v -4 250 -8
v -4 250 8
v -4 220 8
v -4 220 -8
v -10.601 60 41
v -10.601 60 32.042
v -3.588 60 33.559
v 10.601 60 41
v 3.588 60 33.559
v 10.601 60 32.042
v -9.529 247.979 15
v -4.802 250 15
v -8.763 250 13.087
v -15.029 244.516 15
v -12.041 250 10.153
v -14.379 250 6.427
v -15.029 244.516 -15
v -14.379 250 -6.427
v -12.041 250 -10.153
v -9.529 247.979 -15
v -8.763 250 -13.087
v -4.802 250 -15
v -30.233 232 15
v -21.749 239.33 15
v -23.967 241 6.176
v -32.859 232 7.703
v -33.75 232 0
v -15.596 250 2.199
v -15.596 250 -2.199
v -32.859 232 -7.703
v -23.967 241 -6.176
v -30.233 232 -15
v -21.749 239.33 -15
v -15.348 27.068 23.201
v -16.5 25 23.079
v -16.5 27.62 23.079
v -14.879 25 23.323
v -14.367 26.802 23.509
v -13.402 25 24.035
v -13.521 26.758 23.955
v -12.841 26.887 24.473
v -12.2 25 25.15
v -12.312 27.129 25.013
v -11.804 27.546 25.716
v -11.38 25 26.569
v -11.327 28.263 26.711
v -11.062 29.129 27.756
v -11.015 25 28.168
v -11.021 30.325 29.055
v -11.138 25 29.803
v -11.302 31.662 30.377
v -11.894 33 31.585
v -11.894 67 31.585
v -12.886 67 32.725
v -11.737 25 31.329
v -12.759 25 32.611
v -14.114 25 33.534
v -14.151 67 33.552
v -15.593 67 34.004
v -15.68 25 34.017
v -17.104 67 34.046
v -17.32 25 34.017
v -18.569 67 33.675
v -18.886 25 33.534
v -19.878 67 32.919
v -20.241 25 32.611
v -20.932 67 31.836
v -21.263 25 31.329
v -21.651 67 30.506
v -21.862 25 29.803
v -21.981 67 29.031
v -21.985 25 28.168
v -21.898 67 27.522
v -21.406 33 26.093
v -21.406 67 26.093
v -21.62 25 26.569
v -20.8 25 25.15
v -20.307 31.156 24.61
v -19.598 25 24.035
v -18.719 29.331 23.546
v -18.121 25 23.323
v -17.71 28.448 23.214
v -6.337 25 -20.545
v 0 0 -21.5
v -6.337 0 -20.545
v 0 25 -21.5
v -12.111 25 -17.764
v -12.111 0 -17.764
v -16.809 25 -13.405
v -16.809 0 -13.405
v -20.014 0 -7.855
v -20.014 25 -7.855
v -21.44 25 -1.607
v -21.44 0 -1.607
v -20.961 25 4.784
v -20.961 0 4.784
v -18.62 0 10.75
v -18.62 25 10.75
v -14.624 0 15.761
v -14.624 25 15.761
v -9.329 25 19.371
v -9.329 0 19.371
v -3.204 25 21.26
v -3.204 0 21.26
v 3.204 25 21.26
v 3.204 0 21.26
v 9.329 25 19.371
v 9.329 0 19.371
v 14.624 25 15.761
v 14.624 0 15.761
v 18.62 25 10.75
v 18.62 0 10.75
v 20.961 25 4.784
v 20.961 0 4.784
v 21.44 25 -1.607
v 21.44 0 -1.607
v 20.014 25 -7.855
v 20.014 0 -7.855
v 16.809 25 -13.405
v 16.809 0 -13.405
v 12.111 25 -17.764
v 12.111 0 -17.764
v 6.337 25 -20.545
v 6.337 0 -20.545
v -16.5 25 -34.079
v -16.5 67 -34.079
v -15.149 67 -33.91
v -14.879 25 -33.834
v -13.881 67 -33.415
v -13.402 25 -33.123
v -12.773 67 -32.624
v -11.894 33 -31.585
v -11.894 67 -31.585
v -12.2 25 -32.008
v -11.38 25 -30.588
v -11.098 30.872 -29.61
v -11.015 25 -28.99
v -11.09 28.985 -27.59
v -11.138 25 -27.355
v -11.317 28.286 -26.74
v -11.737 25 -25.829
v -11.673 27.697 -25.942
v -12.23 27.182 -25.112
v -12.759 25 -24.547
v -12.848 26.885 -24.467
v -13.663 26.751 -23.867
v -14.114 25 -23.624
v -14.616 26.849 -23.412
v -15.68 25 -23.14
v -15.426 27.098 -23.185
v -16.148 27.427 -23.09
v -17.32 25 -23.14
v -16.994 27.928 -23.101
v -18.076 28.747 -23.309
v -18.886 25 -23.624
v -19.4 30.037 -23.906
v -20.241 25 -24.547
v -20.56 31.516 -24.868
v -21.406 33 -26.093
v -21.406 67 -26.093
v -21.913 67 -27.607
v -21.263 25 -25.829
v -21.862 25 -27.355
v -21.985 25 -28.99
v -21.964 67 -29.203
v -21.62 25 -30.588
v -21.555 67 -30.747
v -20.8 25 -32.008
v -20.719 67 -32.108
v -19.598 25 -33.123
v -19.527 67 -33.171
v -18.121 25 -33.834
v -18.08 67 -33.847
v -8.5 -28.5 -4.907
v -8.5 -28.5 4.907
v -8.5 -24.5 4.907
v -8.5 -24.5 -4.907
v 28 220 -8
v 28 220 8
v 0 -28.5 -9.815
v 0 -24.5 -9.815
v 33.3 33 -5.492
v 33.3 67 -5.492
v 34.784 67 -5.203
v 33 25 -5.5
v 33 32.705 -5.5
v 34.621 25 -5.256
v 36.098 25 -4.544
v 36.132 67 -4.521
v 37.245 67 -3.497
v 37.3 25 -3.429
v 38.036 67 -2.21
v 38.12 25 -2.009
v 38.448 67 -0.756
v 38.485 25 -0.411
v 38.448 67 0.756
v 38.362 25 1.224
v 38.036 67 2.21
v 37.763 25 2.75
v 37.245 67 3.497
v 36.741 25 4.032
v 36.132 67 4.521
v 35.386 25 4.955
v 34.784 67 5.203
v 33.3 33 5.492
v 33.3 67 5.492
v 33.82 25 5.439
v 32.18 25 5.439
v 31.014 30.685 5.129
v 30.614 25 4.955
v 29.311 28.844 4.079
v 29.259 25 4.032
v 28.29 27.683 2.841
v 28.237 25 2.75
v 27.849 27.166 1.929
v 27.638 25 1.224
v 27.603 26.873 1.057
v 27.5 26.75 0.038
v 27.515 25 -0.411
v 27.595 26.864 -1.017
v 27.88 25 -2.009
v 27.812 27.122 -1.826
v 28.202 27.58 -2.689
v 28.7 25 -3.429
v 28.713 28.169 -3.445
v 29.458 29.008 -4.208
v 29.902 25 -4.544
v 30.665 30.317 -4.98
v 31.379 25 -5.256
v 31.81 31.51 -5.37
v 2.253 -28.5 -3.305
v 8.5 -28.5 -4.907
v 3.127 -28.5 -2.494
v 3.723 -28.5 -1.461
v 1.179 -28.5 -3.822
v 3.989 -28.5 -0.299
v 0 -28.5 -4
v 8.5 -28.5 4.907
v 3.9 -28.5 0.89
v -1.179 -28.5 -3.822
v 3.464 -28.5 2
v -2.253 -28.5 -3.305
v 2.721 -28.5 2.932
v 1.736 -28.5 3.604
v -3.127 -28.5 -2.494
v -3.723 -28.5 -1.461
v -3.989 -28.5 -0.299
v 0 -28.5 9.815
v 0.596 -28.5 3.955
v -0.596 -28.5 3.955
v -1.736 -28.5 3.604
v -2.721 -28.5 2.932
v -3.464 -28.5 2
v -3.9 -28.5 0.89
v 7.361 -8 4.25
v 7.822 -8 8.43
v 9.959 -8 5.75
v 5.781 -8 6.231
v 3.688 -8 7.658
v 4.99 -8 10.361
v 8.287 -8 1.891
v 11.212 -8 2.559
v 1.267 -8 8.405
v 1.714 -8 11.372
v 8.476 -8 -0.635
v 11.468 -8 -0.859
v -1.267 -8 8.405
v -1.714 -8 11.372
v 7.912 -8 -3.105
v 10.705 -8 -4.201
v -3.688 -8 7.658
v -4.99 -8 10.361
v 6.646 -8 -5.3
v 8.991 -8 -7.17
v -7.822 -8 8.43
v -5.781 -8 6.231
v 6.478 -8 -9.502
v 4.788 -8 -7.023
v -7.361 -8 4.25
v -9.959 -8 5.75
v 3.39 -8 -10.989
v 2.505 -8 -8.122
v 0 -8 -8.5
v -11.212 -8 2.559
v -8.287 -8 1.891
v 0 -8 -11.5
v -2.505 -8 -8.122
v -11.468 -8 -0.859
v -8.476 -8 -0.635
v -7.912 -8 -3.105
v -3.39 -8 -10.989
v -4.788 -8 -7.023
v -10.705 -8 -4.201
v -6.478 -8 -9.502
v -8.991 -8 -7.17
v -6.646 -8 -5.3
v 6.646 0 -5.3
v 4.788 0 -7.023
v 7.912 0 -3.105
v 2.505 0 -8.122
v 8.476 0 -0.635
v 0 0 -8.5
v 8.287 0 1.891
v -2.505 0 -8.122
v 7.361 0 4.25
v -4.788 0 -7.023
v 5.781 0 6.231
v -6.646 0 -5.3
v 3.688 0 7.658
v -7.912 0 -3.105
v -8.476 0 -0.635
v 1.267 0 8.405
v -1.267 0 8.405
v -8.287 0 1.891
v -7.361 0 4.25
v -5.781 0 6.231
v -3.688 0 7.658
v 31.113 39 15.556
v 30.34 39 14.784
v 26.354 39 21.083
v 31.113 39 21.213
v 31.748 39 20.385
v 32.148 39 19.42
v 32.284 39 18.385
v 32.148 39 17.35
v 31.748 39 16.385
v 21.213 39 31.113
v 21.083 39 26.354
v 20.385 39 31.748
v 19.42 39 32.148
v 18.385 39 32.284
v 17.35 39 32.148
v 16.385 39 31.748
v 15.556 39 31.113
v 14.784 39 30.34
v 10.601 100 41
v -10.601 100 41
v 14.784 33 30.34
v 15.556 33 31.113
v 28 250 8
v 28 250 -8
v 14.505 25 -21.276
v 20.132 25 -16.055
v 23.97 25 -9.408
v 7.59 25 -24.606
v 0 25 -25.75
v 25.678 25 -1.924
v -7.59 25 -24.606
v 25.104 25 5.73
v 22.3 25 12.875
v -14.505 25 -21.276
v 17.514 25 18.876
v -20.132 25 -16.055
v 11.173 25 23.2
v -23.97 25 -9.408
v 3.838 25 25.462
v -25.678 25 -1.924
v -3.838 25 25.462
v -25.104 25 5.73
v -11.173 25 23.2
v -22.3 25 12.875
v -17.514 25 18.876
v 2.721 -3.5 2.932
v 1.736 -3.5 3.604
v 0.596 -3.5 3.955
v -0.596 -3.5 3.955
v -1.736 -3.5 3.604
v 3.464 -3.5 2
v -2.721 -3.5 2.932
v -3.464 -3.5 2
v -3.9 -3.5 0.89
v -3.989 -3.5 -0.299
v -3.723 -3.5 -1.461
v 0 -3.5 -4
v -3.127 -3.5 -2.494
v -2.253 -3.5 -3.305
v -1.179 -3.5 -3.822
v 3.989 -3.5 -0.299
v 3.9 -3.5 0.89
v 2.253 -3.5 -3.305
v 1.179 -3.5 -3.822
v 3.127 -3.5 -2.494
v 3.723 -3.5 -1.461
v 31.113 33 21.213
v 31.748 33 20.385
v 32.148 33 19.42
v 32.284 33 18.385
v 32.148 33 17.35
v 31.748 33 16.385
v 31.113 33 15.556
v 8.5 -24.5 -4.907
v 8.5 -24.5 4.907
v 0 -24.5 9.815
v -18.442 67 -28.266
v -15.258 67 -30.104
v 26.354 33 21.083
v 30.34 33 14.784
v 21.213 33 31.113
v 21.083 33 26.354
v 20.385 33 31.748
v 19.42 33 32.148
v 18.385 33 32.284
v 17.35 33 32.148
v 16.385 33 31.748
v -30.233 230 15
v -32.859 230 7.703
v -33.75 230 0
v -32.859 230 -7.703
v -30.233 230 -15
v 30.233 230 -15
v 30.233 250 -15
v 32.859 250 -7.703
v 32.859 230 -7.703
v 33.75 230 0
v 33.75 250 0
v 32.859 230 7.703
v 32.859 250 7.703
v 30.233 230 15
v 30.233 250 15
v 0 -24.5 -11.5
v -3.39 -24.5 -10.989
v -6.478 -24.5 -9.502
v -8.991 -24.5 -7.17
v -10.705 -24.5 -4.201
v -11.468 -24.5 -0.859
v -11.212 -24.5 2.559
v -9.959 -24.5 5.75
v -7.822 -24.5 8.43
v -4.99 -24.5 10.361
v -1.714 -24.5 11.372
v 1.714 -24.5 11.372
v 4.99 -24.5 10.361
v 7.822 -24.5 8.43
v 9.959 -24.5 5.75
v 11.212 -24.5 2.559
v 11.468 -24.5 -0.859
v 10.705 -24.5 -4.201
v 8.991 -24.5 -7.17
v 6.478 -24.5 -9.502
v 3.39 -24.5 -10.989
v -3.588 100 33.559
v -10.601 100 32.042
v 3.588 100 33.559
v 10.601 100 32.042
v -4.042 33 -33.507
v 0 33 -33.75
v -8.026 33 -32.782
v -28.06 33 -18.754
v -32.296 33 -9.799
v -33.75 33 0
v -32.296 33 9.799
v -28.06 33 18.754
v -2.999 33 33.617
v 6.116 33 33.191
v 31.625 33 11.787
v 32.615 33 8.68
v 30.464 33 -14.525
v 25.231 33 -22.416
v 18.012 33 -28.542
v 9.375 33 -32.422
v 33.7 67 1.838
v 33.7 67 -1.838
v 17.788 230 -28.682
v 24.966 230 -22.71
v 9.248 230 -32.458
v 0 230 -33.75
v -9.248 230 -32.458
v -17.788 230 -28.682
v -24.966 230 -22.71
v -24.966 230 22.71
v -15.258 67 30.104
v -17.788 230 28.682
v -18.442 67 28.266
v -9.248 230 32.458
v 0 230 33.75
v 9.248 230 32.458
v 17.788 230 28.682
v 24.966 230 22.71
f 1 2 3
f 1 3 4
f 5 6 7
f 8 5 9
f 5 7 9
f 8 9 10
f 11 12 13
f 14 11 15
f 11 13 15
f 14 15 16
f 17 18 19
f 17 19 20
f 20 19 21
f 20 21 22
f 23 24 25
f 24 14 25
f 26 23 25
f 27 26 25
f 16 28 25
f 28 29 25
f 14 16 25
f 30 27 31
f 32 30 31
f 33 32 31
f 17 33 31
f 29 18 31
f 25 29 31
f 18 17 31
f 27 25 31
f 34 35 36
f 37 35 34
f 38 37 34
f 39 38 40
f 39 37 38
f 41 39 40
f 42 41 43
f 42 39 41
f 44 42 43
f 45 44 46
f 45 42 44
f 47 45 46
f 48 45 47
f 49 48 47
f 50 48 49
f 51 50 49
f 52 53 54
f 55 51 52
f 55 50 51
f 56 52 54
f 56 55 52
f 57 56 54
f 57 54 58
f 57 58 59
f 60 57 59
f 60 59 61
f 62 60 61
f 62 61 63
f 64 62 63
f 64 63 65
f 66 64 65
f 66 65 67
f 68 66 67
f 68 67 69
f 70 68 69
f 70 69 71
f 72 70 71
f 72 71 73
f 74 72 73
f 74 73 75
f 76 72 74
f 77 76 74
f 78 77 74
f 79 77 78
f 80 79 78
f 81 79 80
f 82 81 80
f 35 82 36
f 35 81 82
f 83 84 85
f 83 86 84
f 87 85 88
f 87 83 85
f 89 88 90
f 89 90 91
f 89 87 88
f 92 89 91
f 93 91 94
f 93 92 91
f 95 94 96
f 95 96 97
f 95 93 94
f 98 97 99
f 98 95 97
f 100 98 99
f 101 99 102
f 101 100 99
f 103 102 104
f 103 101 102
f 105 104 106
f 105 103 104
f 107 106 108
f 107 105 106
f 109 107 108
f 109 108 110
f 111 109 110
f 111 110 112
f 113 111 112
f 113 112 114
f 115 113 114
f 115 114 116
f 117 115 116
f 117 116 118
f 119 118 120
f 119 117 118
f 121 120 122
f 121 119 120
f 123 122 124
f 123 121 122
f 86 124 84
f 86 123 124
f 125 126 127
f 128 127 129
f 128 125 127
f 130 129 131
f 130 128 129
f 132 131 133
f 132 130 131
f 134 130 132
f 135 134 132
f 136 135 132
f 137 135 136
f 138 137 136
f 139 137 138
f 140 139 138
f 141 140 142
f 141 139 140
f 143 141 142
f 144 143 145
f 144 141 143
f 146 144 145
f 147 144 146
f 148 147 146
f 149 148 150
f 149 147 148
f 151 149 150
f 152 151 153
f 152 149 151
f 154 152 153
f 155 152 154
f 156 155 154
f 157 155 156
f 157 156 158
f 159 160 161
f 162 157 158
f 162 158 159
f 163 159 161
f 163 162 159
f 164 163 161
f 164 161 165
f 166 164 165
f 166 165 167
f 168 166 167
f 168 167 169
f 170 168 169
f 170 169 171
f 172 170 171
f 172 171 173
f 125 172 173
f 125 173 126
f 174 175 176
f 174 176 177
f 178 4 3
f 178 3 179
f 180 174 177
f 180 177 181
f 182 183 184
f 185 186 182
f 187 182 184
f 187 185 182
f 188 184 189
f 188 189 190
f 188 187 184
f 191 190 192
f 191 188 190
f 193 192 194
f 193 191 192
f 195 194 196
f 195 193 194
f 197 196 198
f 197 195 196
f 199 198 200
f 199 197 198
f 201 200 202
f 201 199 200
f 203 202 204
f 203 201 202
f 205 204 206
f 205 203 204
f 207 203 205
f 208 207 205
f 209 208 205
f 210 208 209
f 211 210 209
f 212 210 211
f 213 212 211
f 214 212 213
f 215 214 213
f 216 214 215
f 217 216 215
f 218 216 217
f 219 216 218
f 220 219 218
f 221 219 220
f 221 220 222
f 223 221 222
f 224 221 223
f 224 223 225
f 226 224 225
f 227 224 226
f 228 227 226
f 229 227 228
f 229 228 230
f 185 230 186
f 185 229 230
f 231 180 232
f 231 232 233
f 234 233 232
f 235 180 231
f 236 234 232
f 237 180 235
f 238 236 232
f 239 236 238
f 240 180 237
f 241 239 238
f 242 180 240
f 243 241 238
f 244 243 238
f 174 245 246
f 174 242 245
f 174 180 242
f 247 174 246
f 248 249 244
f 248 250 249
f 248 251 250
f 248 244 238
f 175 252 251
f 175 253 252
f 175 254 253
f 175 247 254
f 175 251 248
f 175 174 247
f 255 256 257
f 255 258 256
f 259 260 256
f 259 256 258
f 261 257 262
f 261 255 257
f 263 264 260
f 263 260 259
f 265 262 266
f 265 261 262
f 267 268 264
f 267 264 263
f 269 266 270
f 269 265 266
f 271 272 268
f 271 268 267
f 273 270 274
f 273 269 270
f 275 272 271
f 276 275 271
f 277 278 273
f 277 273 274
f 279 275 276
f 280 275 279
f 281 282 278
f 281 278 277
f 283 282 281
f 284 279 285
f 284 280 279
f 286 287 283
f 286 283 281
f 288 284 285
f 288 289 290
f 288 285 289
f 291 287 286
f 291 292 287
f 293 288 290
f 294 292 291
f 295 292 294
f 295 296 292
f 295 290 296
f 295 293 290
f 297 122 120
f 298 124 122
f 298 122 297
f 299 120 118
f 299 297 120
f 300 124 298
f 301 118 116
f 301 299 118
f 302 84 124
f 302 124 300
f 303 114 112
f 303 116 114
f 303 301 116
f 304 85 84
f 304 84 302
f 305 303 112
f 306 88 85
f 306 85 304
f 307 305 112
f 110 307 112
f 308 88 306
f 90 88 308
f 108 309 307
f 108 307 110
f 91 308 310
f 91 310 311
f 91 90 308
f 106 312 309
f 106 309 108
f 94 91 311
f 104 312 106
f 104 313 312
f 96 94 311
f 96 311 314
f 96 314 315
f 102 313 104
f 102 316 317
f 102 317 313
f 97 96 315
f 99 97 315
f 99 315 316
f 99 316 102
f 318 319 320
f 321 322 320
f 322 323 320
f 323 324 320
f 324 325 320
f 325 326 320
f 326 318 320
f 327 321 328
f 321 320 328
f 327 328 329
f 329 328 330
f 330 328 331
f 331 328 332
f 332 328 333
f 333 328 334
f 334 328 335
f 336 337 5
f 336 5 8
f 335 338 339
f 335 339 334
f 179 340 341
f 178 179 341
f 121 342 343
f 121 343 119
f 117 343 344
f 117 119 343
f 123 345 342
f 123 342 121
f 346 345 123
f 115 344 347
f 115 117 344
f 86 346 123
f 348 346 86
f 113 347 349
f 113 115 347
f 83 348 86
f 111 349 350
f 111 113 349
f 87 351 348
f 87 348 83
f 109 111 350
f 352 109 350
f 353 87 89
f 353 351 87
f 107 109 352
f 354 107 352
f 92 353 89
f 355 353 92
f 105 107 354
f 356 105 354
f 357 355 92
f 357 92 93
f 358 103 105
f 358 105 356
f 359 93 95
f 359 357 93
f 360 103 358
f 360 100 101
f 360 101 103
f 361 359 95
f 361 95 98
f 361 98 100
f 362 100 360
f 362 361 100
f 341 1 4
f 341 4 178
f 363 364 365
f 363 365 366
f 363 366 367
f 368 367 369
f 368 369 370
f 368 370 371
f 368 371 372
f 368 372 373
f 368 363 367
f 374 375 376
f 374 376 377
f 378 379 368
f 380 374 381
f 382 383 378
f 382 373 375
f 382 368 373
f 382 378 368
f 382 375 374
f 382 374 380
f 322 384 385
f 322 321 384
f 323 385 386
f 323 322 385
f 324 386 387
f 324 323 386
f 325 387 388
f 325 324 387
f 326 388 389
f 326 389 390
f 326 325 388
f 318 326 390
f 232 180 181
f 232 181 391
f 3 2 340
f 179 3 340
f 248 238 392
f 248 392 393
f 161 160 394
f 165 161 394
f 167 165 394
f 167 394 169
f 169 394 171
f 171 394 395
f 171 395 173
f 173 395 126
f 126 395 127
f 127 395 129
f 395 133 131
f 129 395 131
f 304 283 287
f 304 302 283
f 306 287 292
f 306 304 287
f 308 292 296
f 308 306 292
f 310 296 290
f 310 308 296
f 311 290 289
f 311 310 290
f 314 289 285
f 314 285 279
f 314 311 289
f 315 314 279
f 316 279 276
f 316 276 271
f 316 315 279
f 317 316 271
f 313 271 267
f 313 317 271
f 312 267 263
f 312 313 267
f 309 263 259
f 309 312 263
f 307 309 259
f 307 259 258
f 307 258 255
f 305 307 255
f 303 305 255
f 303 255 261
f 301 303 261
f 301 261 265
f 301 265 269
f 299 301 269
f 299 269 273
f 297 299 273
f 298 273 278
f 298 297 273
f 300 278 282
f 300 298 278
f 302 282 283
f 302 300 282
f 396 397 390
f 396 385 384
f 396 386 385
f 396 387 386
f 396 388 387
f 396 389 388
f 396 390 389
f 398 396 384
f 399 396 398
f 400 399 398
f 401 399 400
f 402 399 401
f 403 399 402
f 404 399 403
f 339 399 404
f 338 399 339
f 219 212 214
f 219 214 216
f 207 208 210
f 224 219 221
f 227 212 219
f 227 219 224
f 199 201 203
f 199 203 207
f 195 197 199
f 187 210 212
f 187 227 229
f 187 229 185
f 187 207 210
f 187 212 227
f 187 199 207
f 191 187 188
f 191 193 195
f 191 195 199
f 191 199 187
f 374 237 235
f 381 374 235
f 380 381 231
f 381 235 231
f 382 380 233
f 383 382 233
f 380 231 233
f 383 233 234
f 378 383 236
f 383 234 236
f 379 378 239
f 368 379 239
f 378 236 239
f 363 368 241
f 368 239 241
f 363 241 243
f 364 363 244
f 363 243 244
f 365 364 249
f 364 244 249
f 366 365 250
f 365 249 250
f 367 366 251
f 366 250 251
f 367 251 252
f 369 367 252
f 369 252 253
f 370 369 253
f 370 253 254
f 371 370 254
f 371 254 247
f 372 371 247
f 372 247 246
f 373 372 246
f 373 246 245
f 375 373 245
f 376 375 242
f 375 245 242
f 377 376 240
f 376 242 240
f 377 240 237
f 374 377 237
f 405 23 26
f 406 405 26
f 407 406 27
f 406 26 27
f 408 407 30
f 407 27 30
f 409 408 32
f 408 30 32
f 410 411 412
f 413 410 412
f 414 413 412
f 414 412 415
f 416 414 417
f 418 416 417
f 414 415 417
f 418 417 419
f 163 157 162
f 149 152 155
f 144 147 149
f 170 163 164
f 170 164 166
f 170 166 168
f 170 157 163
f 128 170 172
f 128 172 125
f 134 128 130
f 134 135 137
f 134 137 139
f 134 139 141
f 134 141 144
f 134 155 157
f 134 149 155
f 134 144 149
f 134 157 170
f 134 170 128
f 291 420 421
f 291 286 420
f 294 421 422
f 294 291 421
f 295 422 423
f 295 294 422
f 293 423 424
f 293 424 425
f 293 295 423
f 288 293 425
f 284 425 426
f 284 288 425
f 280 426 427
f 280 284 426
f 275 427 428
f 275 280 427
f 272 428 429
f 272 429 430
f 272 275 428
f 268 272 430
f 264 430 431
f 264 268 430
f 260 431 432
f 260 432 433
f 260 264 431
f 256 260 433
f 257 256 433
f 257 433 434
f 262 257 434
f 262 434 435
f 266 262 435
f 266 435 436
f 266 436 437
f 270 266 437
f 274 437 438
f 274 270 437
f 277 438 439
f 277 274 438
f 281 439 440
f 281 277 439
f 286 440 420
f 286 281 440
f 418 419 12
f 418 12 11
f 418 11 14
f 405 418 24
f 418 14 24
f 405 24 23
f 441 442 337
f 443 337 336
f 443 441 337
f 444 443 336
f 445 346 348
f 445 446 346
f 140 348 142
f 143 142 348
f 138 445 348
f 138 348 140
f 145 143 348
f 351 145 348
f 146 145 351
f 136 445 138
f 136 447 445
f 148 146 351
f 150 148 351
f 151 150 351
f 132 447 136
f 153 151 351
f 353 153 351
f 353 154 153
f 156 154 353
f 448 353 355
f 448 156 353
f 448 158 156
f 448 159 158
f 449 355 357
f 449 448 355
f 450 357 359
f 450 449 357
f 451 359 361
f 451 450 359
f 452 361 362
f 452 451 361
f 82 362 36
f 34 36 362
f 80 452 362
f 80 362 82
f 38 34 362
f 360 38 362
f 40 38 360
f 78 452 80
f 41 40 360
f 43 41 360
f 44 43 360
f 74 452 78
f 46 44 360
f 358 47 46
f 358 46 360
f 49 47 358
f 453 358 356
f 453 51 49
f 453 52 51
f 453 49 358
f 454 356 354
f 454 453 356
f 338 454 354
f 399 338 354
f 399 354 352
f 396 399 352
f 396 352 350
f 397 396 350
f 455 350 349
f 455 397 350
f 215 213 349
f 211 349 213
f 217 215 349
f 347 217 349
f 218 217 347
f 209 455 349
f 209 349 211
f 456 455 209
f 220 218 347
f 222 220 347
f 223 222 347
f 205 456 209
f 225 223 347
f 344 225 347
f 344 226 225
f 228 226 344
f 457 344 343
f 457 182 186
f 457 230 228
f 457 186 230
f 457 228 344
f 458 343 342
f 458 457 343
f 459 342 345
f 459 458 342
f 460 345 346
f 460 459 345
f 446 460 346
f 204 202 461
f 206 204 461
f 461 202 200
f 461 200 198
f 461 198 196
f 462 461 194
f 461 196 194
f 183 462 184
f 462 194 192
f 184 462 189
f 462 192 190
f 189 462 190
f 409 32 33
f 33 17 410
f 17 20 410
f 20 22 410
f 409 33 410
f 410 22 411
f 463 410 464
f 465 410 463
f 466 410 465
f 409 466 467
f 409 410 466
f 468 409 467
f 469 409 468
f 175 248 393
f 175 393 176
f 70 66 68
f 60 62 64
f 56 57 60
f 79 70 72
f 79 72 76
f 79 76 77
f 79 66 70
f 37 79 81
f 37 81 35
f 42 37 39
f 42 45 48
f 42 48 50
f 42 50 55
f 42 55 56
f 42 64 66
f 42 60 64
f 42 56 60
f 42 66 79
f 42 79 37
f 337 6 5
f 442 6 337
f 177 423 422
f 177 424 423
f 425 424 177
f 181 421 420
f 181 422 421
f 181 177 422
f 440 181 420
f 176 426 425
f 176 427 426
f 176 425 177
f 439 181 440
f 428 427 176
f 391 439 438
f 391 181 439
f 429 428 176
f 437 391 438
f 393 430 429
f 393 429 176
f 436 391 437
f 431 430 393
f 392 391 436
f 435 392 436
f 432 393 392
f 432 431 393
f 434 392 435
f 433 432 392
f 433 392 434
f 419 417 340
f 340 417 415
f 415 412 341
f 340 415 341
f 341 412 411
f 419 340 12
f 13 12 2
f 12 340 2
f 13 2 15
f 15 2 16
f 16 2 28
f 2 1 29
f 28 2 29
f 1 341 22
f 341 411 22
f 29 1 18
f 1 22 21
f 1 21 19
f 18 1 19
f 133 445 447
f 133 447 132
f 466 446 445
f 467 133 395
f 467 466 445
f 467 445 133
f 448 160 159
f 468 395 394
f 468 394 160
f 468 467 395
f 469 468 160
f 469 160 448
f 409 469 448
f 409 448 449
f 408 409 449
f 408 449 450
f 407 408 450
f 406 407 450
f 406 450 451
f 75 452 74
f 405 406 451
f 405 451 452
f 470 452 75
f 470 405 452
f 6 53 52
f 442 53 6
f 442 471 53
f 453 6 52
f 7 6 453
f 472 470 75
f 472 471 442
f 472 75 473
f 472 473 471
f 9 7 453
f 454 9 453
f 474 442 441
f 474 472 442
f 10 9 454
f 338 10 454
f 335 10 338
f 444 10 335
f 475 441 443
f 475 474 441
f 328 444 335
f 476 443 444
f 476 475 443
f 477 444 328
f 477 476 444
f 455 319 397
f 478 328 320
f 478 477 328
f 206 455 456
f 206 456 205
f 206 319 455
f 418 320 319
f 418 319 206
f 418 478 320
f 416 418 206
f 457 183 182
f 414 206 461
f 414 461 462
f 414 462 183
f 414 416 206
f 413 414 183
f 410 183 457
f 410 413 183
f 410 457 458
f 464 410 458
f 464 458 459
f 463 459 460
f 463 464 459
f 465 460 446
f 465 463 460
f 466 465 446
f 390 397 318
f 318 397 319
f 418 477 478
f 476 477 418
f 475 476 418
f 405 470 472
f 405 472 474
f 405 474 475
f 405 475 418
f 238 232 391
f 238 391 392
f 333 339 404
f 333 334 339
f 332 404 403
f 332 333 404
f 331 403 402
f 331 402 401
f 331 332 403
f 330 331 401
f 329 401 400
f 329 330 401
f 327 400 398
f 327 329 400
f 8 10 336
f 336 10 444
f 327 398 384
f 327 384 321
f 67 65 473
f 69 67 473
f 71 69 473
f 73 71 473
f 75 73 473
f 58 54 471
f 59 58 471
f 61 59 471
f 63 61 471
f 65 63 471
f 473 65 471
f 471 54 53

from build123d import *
from build123d.topology import SkipClean

# Parameters (mm, degrees)
SKIZZE2_W                       = 21.201346
SKIZZE2_H                       = 40
AUFSATZ_LINEAR_AUSTRAGEN1_DEPTH = 41
SKIZZE3_R                       = 5.5
AUFSATZ_LINEAR_AUSTRAGEN2_DEPTH = 42
SKIZZE4_R                       = 4
SCHNITT_LINEAR_AUSTRAGEN1_DEPTH = 25
SKIZZE5_OUTSIDE_W               = 129.992
SKIZZE5_OUTSIDE_H               = 132.821
SCHNITT_LINEAR_AUSTRAGEN2_DEPTH = 4
SKIZZE6_W                       = 6
SKIZZE6_H                       = 22
AUFSATZ_LINEAR_AUSTRAGEN3_DEPTH = 37
VERRUNDUNG1_R                   = 4
AUFSATZ_LINEAR_START            = 20
AUFSATZ_LINEAR_AUSTRAGEN4_DEPTH = 20
SKIZZE8_W                       = 32
SKIZZE8_H                       = 16
SCHNITT_LINEAR_AUSTRAGEN3_DEPTH = 30
FASE1_SIZE                      = 18


with BuildPart() as part:
    # Skizze1 → Rotation1 (revolve)
    with BuildSketch(Plane.XY):
        Polygon((8.5, 0), (21.5, 0), (21.5, 25), (25.75, 25), (33.75, 33), (33.75, 230), (0, 230), (0, -28.5), (11.5, -28.5), (11.5, -8), (8.5, -8), align=None)
    revolve(axis=Axis((0, 0, 0), (0, 1, 0)))

    # Skizze2 → Aufsatz-Linear austragen1 (add)
    with BuildSketch(Plane.XY):
        with Locations((0, 80)):
            Rectangle(SKIZZE2_W, SKIZZE2_H)
    extrude(amount=AUFSATZ_LINEAR_AUSTRAGEN1_DEPTH)

    # Skizze3 → Aufsatz-Linear austragen2 (add)
    with BuildSketch(Plane.XZ.offset(-25)):
        with Locations((33, 0)):
            Circle(SKIZZE3_R)
        with Locations((-16.5, 28.578838)):
            Circle(SKIZZE3_R)
        with Locations((-16.5, -28.578838)):
            Circle(SKIZZE3_R)
    extrude(amount=-AUFSATZ_LINEAR_AUSTRAGEN2_DEPTH)

    # Skizze4 → Schnitt-Linear austragen1 (cut)
    with BuildSketch(Plane.XZ.offset(28.5)):
        Circle(SKIZZE4_R)
    extrude(amount=-SCHNITT_LINEAR_AUSTRAGEN1_DEPTH, mode=Mode.SUBTRACT)

    # Skizze5 outside → Schnitt-Linear austragen2 (cut)
    with BuildSketch(Plane.XZ.offset(28.5)):
        with Locations((2.375, 3.4605)):
            Rectangle(SKIZZE5_OUTSIDE_W, SKIZZE5_OUTSIDE_H)
        Polygon((-8.5, -4.907477), (0, -9.814955), (8.5, -4.907477), (8.5, 4.907477), (0, 9.814955), (-8.5, 4.907477), align=None, mode=Mode.SUBTRACT)
    extrude(amount=-SCHNITT_LINEAR_AUSTRAGEN2_DEPTH, mode=Mode.SUBTRACT)

    # Skizze6 → Aufsatz-Linear austragen3 (add)
    with BuildSketch(Plane(origin=(0, 0, 0), x_dir=(0, 1, 0), z_dir=(0.7071067811865488, 0, 0.7071067811865464))):
        with Locations((36, 0)):
            Rectangle(SKIZZE6_W, SKIZZE6_H)
    extrude(amount=AUFSATZ_LINEAR_AUSTRAGEN3_DEPTH)

    # Verrundung1
    verrundung1_edges = [part.edges().sort_by_distance(p)[0] for p in [
        (18.384776, 36, 33.941125),
        (33.941125, 36, 18.384776),
    ]]
    fillet(verrundung1_edges, radius=VERRUNDUNG1_R)

    # Skizze7 → Aufsatz-Linear austragen4 (add)
    with SkipClean():  # the faces are left unmerged after this step: merging them gives an invalid solid
        with BuildSketch(Plane(origin=(0, 230, 0), x_dir=(1, 0, 0), z_dir=(0, 1, 0)).offset(AUFSATZ_LINEAR_START)):
            with BuildLine():
                Line((-30.233467, 15), (30.233467, 15))
                ThreePointArc((30.233467, 15), (33.75, 0), (30.233467, -15))
                Line((30.233467, -15), (-30.233467, -15))
                ThreePointArc((-30.233467, -15), (-33.75, 0), (-30.233467, 15))
            make_face()
        extrude(amount=-AUFSATZ_LINEAR_AUSTRAGEN4_DEPTH)

    # Skizze8 → Schnitt-Linear austragen3 (cut)
    with SkipClean():  # the faces are left unmerged after this step: merging them gives an invalid solid
        with BuildSketch(Plane(origin=(0, 250, 0), x_dir=(1, 0, 0), z_dir=(0, 1, 0))):
            with Locations((12, 0)):
                Rectangle(SKIZZE8_W, SKIZZE8_H)
        extrude(amount=-SCHNITT_LINEAR_AUSTRAGEN3_DEPTH, mode=Mode.SUBTRACT)

    # Fase1
    fase1_edges = [part.edges().sort_by_distance(p)[0] for p in [
        (-33.75, 250, 0),
    ]]
    chamfer(fase1_edges, length=FASE1_SIZE)


solid = part.part
